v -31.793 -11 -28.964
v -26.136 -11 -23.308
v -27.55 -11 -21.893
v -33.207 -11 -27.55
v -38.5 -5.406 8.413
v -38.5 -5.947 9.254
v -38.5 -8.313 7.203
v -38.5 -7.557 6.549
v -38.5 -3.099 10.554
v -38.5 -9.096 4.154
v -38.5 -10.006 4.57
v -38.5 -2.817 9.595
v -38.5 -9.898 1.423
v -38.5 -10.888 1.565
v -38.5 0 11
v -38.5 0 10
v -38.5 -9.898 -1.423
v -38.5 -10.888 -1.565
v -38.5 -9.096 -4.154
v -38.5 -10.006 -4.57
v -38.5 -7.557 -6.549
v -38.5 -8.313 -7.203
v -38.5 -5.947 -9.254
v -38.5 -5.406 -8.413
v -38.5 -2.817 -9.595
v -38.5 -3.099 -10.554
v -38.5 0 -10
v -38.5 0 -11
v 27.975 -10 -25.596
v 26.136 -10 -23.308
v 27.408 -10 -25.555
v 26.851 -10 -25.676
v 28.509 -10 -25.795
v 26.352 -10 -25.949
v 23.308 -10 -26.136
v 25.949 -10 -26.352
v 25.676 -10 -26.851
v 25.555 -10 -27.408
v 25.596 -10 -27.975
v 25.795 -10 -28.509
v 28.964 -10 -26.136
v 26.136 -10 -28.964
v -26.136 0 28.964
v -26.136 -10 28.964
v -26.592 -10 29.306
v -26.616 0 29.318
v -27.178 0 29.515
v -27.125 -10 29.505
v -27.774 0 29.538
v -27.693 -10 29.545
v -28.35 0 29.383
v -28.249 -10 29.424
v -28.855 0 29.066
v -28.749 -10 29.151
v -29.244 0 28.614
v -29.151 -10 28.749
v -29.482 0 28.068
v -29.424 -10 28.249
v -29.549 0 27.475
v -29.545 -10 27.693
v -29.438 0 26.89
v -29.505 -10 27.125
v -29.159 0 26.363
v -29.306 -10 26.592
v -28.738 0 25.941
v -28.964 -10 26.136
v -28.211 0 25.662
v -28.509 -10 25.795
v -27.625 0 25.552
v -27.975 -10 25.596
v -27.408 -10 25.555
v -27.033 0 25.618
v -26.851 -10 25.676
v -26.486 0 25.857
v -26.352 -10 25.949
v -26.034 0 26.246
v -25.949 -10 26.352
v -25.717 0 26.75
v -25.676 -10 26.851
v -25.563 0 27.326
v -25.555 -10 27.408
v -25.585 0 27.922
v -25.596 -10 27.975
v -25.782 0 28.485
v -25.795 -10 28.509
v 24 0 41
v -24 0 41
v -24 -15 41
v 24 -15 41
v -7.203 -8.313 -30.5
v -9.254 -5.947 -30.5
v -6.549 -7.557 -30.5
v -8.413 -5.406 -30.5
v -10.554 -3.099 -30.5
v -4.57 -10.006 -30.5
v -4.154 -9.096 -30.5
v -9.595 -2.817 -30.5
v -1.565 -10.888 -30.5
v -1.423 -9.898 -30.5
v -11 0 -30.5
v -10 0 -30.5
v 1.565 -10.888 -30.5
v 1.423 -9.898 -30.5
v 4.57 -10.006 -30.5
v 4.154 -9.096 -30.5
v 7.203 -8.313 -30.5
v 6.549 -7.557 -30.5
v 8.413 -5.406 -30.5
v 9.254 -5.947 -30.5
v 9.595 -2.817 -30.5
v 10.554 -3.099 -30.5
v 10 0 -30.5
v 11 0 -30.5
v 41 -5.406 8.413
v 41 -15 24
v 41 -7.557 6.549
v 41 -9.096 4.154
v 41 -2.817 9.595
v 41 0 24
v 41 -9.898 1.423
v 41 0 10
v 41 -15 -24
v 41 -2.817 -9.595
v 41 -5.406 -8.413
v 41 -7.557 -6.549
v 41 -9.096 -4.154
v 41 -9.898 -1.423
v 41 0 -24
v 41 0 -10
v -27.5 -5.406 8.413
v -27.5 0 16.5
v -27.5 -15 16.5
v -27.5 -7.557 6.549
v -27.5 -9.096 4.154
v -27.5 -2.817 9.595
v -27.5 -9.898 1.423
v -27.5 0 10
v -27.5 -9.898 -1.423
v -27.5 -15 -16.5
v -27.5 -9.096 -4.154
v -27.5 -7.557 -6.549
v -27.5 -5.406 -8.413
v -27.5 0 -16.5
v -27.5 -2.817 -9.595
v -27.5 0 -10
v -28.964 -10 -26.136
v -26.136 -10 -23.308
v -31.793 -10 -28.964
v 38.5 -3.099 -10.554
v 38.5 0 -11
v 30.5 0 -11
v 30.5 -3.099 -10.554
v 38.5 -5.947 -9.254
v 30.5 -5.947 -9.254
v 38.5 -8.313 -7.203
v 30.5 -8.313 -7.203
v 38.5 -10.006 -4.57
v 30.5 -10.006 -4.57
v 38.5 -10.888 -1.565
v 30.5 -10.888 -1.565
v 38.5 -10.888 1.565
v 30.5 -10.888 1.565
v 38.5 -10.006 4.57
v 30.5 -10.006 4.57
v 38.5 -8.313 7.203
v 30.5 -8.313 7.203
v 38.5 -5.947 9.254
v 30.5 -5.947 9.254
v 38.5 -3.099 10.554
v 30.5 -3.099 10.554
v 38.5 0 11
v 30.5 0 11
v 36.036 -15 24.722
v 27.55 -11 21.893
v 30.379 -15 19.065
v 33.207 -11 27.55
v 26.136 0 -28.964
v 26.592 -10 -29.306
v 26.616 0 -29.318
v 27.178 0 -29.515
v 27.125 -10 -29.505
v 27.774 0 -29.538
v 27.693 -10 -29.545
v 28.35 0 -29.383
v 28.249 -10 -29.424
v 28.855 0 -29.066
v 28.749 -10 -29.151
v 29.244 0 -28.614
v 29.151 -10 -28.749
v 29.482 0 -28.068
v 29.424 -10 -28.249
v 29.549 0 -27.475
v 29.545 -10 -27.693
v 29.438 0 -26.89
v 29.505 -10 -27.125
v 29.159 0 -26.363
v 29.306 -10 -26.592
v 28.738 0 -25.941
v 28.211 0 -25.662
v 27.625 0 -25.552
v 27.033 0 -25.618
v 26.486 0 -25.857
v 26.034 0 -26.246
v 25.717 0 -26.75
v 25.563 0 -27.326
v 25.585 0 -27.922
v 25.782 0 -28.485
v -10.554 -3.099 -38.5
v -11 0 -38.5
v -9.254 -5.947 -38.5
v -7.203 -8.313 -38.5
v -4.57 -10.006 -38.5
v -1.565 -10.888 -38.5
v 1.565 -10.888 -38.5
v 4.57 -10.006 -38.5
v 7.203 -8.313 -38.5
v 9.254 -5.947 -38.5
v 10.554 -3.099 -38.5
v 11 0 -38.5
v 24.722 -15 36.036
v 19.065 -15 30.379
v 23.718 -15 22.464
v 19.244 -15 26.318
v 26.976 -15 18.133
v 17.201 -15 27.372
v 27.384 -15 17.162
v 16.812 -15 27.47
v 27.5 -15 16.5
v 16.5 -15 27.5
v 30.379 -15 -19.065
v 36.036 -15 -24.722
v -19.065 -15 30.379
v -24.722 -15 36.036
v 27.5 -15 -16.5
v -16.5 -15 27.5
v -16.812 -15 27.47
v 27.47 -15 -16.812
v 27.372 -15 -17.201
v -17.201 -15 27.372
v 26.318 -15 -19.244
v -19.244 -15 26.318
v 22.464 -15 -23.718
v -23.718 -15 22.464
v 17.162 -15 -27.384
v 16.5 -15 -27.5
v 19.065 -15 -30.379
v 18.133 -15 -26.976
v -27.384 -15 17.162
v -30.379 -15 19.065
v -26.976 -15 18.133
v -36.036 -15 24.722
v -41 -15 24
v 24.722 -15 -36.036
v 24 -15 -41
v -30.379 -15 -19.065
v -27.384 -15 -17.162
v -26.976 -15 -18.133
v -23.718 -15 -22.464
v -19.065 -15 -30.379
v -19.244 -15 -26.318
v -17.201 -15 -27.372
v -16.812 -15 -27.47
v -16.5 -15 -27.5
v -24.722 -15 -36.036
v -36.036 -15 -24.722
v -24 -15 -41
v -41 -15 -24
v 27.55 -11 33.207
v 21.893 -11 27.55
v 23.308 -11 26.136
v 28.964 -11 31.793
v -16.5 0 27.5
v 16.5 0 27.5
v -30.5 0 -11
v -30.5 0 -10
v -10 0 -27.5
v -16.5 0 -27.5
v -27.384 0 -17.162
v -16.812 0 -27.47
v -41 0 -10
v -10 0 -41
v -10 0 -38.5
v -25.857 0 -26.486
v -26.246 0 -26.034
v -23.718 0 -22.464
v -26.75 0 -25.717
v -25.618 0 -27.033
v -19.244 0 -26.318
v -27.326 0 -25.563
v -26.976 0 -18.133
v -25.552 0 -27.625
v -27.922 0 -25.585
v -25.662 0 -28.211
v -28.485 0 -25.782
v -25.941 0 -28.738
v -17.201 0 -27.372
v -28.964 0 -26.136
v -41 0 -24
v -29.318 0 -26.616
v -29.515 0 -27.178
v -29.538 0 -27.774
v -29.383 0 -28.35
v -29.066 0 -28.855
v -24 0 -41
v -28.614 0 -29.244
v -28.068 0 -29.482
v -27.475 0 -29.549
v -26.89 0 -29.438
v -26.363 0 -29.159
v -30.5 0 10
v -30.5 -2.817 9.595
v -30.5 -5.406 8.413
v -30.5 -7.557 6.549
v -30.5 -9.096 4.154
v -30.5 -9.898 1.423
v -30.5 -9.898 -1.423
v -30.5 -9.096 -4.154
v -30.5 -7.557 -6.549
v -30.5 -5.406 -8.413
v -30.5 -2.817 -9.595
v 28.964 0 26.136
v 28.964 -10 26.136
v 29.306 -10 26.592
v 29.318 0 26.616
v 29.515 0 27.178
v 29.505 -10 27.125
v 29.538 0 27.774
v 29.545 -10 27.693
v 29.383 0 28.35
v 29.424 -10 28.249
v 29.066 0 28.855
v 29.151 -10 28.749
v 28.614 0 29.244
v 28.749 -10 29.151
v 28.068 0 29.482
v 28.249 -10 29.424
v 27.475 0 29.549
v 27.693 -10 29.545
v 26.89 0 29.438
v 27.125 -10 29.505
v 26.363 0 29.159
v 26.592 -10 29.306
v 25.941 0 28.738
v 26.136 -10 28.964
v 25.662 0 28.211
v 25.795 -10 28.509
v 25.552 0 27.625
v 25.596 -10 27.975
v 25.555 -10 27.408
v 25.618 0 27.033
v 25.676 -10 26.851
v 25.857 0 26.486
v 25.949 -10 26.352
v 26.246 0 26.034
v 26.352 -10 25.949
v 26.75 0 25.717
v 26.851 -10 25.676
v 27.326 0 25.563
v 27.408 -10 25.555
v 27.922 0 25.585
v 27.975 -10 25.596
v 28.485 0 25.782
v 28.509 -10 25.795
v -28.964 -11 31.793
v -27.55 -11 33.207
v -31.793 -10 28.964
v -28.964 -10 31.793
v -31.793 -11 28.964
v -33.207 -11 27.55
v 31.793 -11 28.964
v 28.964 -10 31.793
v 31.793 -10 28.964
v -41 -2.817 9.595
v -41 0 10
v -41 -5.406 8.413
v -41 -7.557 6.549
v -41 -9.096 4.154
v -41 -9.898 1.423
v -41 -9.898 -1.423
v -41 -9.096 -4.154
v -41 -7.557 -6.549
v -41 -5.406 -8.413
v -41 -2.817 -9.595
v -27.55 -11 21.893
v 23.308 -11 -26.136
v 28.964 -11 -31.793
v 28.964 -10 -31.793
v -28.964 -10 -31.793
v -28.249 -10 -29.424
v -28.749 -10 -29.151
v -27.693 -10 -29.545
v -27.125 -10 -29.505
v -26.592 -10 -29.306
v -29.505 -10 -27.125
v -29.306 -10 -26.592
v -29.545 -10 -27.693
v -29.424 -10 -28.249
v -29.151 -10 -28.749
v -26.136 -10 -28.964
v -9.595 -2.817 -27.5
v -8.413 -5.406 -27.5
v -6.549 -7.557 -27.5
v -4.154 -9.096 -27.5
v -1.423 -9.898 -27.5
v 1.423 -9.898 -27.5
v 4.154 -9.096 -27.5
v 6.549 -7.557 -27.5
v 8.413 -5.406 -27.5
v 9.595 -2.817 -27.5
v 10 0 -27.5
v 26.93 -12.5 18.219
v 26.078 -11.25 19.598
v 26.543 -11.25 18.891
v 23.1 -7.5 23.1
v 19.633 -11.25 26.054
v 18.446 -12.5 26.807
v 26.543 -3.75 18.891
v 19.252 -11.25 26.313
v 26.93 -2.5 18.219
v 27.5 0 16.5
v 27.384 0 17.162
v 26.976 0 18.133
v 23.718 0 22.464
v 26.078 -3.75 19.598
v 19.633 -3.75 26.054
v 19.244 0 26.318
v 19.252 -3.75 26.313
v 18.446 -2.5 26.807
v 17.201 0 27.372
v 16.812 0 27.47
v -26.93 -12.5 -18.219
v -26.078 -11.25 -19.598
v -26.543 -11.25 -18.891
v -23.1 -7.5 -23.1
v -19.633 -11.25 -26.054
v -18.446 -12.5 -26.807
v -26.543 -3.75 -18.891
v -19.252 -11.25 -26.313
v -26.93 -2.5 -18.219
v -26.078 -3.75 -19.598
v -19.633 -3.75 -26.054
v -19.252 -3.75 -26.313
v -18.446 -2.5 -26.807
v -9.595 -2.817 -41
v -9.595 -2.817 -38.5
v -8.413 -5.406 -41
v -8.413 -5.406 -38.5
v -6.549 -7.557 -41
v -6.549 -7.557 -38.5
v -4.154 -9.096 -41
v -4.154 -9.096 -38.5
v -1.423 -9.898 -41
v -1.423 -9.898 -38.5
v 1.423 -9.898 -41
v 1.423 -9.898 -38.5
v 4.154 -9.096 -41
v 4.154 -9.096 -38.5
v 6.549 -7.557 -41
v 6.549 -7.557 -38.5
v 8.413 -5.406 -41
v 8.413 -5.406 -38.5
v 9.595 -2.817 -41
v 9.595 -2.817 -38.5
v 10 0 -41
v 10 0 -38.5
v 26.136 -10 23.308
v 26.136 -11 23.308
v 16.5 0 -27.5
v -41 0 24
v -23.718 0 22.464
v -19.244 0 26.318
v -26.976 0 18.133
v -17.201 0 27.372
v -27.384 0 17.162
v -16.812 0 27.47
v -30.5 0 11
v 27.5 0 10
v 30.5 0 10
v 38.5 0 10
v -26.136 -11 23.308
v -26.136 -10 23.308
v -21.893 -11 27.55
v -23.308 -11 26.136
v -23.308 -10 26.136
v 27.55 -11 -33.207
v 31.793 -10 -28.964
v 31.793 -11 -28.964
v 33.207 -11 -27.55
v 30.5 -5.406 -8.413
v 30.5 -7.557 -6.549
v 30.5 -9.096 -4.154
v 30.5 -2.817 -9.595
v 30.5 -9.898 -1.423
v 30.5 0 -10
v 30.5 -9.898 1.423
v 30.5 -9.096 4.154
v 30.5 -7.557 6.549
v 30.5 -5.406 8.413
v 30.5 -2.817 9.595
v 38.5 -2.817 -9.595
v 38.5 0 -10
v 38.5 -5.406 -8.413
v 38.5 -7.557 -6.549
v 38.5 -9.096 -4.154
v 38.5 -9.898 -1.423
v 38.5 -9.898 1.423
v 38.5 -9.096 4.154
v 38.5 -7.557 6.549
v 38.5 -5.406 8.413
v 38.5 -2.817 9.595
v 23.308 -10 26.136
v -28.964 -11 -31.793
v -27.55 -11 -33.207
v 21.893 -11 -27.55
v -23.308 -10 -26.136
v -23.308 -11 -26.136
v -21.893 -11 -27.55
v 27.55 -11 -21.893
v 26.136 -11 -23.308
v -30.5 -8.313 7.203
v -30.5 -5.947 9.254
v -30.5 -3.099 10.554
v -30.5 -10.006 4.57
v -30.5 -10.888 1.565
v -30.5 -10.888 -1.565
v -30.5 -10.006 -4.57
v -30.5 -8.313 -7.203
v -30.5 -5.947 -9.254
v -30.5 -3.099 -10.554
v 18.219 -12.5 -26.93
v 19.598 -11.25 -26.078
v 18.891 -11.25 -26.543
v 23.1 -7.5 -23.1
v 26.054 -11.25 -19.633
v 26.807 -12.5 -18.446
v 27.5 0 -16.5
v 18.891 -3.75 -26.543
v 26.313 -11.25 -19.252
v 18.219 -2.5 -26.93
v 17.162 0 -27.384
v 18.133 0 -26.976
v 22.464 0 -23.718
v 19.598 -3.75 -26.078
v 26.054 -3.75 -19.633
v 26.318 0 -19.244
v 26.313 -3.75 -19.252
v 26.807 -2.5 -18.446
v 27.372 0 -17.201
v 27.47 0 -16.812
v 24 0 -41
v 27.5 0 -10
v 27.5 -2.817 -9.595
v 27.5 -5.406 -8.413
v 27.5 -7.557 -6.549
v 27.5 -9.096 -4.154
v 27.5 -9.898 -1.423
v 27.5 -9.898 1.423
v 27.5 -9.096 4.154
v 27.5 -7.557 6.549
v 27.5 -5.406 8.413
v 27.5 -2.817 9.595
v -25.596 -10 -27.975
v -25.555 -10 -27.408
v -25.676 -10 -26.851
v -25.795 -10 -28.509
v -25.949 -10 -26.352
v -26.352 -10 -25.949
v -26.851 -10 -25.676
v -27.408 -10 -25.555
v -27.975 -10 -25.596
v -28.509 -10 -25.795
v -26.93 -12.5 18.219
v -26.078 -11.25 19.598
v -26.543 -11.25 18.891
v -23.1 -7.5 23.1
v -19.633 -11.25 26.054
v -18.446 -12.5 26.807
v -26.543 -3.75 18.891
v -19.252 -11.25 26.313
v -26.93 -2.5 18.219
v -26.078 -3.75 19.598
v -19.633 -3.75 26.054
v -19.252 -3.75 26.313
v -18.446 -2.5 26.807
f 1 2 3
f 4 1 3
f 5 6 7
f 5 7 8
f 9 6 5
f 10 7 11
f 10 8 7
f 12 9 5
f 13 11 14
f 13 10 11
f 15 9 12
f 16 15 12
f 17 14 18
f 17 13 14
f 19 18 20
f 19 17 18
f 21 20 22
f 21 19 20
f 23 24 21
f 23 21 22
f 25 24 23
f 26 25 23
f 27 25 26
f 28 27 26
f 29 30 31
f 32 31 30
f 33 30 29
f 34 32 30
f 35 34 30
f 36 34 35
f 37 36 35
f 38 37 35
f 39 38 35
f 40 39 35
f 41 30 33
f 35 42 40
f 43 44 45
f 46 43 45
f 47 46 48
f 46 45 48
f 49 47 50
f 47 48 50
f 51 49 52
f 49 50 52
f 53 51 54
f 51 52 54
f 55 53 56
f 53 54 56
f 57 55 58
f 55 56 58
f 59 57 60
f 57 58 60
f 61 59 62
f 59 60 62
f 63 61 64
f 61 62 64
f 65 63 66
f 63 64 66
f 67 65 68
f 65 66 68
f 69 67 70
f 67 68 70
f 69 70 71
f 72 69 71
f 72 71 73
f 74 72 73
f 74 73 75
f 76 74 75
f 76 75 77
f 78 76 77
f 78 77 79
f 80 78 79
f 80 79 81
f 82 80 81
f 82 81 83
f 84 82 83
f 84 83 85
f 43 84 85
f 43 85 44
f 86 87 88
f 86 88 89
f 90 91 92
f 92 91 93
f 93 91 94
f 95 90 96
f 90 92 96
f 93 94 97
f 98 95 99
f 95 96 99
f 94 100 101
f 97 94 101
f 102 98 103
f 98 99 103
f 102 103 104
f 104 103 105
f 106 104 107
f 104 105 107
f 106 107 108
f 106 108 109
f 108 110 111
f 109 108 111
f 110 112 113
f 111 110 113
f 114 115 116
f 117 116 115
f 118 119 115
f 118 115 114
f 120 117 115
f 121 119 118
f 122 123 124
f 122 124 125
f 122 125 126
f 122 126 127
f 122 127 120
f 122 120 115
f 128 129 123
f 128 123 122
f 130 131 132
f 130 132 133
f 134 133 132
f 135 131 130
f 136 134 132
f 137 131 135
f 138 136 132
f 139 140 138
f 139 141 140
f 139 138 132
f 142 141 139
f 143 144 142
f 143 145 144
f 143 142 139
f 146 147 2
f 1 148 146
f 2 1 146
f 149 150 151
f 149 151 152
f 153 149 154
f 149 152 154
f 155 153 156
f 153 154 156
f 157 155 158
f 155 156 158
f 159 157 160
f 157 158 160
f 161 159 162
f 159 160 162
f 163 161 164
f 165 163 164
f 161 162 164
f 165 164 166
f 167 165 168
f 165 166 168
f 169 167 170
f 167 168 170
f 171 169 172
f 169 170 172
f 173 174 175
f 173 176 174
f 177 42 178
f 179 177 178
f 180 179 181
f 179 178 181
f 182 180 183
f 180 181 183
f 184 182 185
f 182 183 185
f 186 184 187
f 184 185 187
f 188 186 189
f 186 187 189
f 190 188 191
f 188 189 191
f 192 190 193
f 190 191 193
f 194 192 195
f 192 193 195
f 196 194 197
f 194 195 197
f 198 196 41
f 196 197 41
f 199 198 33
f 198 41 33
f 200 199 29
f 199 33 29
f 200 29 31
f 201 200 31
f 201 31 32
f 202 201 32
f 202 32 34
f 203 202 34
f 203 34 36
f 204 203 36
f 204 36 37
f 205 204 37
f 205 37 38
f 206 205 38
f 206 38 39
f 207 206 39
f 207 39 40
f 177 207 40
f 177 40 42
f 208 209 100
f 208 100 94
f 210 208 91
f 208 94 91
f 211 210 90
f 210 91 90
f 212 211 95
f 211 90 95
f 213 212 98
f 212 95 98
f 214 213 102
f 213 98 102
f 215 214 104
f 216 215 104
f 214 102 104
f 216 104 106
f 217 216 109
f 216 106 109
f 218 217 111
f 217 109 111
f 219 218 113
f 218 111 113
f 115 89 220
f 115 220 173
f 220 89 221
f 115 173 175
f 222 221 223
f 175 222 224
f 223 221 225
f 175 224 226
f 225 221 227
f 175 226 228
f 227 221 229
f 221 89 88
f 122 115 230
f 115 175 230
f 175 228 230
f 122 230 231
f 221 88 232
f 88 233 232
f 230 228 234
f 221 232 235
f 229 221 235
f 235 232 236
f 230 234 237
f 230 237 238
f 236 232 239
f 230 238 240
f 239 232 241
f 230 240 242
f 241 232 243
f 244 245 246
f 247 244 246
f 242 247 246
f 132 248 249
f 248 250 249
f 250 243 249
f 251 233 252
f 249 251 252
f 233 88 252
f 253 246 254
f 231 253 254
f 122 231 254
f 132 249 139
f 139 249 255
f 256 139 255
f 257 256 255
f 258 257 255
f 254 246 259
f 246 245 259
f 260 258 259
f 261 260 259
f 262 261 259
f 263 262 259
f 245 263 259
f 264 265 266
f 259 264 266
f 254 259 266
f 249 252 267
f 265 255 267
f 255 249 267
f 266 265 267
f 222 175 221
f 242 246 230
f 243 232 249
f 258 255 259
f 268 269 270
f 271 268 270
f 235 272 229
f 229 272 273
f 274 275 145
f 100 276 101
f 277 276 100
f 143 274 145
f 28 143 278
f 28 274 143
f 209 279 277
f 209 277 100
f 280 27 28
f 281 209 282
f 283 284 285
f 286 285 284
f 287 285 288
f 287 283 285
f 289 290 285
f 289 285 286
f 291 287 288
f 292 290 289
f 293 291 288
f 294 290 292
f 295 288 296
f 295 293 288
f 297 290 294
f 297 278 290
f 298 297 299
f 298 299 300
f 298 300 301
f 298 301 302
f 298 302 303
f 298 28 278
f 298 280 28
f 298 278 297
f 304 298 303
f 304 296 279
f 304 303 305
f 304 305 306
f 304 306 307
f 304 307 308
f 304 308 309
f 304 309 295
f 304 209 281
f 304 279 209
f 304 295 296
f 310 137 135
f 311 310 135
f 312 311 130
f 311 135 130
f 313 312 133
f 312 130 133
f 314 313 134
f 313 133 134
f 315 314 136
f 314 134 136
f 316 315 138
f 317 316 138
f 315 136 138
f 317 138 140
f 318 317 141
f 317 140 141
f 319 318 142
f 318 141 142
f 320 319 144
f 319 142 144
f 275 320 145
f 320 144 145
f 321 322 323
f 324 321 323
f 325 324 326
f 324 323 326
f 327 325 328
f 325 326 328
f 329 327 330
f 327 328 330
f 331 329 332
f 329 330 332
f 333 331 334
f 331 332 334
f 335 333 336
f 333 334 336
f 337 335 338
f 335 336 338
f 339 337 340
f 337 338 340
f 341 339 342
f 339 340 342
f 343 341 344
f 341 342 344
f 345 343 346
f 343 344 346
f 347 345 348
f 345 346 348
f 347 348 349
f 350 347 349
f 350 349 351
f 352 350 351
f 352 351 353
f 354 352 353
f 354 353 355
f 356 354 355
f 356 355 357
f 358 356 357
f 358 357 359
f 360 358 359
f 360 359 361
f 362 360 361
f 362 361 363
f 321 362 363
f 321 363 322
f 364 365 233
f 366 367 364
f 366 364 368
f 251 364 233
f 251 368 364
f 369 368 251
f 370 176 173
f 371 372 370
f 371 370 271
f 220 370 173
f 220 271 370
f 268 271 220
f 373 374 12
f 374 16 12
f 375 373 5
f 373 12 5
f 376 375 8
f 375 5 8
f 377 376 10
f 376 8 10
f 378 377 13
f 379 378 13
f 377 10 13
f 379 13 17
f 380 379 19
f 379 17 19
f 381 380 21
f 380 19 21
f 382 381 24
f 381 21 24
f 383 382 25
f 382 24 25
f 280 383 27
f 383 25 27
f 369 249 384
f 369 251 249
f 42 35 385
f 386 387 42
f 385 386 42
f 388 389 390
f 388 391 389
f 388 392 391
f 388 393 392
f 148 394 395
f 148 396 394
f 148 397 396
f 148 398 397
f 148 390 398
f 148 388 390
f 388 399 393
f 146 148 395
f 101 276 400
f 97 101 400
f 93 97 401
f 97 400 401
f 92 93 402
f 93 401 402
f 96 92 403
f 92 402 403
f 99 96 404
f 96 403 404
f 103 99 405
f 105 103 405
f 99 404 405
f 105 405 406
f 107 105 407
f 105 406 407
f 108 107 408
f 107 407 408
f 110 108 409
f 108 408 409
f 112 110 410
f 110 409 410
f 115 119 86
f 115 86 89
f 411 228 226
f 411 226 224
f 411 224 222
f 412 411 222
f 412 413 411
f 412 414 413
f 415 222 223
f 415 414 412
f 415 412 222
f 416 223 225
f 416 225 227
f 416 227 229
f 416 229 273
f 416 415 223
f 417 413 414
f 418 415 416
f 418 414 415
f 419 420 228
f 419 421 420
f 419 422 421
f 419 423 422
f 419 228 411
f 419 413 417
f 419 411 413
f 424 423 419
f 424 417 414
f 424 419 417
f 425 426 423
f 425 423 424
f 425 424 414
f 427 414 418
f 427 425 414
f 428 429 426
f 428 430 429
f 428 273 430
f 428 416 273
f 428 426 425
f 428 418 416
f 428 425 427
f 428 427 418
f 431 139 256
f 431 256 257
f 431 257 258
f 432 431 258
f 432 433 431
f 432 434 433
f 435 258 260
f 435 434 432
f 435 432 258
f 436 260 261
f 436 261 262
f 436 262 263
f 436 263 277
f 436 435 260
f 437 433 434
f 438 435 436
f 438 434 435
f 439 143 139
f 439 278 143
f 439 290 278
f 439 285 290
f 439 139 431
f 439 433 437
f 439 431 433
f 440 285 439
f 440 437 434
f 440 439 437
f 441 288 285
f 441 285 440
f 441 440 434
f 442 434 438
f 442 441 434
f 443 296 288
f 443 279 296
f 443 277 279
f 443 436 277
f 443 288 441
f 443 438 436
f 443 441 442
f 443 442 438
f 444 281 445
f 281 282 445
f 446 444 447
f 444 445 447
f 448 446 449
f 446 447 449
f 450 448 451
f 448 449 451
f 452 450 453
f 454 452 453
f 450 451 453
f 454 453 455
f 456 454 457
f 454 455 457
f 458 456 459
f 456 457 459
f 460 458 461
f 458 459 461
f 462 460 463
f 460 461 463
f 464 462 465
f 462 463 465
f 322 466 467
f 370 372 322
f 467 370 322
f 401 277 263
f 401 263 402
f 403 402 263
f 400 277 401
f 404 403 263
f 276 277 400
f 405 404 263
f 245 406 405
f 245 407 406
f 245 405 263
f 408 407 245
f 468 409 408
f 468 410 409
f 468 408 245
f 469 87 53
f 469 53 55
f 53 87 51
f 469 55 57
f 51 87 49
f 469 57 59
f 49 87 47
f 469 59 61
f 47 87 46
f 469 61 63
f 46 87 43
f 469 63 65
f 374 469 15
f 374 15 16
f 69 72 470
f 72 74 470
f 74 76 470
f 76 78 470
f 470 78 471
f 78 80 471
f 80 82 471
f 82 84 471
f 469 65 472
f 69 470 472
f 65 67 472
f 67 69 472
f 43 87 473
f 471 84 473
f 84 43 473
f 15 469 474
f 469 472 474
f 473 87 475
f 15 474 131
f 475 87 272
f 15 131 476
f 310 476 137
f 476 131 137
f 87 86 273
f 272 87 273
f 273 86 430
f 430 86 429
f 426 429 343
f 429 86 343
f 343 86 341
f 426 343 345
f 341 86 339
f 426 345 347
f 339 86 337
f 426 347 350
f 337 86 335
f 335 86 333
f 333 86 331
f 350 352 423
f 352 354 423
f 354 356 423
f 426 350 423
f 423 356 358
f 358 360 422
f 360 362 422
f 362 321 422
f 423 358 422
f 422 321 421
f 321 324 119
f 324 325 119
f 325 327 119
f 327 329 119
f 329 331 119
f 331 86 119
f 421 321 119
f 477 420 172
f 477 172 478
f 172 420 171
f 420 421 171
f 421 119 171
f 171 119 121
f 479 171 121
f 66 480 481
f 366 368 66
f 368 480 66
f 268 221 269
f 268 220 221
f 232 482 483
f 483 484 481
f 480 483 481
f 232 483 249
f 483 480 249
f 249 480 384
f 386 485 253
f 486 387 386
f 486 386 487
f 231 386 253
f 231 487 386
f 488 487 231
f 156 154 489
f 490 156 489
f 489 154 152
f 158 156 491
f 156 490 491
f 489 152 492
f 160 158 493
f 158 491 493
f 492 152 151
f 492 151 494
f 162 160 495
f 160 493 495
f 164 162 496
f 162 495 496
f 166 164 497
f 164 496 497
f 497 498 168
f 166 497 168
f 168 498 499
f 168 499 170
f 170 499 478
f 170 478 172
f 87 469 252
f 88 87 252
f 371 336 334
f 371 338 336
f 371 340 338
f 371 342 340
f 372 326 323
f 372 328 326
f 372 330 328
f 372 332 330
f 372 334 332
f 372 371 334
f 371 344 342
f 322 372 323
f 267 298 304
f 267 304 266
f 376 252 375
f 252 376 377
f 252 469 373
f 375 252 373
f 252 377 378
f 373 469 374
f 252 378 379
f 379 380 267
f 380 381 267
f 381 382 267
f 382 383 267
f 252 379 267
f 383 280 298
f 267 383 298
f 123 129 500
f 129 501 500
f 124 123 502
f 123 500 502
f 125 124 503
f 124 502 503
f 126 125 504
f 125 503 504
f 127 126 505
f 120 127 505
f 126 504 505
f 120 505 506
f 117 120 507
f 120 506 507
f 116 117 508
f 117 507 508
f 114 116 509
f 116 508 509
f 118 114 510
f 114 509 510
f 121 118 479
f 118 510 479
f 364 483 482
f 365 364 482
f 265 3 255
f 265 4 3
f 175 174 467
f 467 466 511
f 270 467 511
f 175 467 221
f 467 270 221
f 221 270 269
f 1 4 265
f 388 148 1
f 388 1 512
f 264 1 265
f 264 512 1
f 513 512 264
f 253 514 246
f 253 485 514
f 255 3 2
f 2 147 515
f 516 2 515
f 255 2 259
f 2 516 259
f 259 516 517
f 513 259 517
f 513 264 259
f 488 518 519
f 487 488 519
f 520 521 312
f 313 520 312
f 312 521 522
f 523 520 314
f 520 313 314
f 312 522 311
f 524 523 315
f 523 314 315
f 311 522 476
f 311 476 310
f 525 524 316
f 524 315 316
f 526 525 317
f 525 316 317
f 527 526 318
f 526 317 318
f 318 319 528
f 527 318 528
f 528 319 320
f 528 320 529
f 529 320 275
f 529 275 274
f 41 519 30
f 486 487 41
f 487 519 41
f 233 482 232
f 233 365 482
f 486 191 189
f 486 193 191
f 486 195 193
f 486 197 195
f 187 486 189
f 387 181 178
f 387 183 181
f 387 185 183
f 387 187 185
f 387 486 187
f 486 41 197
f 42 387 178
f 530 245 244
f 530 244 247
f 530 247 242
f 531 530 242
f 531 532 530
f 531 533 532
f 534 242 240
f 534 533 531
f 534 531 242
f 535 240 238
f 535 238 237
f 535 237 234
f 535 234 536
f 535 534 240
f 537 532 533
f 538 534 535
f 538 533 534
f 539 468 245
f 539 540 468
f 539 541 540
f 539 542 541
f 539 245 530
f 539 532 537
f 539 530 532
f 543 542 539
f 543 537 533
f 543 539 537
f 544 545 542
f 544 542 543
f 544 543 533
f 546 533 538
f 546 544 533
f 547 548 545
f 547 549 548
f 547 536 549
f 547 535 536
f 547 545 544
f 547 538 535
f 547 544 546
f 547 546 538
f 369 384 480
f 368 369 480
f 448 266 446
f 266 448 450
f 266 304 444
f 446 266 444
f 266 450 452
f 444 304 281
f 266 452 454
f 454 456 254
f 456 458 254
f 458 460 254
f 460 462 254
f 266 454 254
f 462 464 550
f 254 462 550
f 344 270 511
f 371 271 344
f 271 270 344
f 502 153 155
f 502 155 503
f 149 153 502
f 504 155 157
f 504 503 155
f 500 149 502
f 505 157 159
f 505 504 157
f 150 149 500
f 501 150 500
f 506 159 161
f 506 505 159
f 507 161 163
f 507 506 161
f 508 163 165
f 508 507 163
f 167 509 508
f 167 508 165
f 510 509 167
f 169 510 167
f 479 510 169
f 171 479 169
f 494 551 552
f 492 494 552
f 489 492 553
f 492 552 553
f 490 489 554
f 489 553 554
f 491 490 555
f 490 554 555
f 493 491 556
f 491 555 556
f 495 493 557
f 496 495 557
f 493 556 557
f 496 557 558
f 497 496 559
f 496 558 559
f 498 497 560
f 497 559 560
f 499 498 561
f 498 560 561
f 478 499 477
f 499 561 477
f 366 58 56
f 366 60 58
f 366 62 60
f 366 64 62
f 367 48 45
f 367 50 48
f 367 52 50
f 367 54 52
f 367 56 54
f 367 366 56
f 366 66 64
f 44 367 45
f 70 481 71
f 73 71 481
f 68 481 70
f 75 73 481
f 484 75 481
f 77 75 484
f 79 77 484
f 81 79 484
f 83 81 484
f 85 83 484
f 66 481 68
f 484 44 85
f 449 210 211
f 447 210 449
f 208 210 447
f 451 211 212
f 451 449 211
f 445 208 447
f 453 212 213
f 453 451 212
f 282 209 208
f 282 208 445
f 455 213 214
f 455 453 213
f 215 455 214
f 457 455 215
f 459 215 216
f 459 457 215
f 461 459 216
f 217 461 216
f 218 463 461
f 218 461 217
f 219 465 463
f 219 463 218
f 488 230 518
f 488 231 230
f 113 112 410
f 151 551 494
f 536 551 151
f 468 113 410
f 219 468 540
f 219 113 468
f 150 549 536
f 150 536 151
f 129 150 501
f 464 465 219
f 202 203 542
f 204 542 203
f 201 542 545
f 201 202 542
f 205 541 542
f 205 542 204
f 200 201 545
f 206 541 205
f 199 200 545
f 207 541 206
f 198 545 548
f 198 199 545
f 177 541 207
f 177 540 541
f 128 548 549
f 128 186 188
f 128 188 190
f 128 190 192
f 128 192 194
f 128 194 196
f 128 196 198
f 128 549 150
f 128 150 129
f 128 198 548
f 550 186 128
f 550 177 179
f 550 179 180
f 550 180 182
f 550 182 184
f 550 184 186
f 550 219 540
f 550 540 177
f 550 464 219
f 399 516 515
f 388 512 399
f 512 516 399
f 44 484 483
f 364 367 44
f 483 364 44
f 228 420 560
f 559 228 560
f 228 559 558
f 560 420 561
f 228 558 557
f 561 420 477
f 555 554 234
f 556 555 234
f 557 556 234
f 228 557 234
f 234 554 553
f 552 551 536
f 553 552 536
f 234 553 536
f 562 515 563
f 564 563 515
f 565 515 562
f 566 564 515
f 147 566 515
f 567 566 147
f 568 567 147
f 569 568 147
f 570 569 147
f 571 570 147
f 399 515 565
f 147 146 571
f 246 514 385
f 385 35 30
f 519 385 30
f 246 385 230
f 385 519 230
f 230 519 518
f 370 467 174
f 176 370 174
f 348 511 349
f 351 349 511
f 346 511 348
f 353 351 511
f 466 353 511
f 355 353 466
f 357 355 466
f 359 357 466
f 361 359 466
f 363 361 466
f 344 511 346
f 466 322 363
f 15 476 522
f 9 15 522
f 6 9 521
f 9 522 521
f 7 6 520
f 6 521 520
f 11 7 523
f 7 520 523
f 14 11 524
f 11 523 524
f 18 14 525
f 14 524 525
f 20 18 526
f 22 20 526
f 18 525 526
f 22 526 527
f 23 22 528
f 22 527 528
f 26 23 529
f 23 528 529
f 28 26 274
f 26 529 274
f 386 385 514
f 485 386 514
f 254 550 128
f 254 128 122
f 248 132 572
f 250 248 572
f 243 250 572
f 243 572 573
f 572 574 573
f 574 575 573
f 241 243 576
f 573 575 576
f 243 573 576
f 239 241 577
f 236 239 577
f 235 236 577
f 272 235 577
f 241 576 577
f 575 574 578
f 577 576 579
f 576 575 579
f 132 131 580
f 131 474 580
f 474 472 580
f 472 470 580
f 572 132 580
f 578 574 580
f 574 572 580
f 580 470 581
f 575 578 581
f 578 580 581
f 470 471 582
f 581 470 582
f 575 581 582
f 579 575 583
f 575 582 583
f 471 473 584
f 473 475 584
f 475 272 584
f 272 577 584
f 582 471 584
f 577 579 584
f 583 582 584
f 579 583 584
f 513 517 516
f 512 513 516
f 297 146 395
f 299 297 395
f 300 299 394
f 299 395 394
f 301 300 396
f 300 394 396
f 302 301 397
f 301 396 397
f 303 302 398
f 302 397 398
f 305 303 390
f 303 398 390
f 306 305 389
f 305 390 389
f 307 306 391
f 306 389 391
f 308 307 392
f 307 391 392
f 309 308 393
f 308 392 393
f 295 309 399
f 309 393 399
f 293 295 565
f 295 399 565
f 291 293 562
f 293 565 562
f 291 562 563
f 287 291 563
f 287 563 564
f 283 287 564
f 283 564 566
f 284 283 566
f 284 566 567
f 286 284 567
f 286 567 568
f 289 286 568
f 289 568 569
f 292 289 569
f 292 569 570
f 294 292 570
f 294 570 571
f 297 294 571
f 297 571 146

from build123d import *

# Parameters (mm, degrees)
SKETCH1_W           = 82
SKETCH1_H           = 82
SKETCH1_W_2         = 55
SKETCH1_H_2         = 55
BOSS_EXTRUDE1_DEPTH = 15
SKETCH2_R           = 10
CUT_EXTRUDE1_DEPTH  = 60.891568689
CUT_EXTRUDE2_START  = -30.5
SKETCH3_R           = 11
CUT_EXTRUDE2_DEPTH  = 8
CIRPATTERN3_COUNT   = 3
CIRPATTERN3_ANGLE   = 180
FILLET1_SIZE        = 11
CHAMFER1_SIZE       = 17
CUT_EXTRUDE3_START  = -7
CUT_EXTRUDE3_DEPTH  = 4
SKETCH5_R           = 2
CUT_EXTRUDE4_DEPTH  = 59.83876289
CIRPATTERN4_COUNT   = 4


with BuildPart() as part:
    # Sketch1 → Boss-Extrude1 (new body)
    with BuildSketch(Plane(origin=(0, 0, 0), x_dir=(1, 0, 0), z_dir=(0, 1, 0))):
        Rectangle(SKETCH1_W, SKETCH1_H)
        Rectangle(SKETCH1_W_2, SKETCH1_H_2, mode=Mode.SUBTRACT)
    extrude(amount=-BOSS_EXTRUDE1_DEPTH)

    # Sketch2 → Cut-Extrude1 (cut, through all)
    with BuildSketch(Plane(origin=(0, 0, 0), x_dir=(0, 0, -1), z_dir=(1, 0, 0))):
        Circle(SKETCH2_R)
    cut_extrude1 = extrude(amount=-CUT_EXTRUDE1_DEPTH, mode=Mode.SUBTRACT)

    # Sketch3 → Cut-Extrude2 (cut)
    with BuildSketch(Plane(origin=(0, 0, 0), x_dir=(0, 0, -1), z_dir=(1, 0, 0)).offset(CUT_EXTRUDE2_START)):
        Circle(SKETCH3_R)
    cut_extrude2 = extrude(amount=-CUT_EXTRUDE2_DEPTH, mode=Mode.SUBTRACT)

    # CirPattern3: Cut-Extrude1, Cut-Extrude2 ×3 about axis
    cirpattern3_axis = Axis((0, 0, 0), (0, -1, 0))
    add([cut_extrude1.rotate(cirpattern3_axis, i * CIRPATTERN3_ANGLE / (CIRPATTERN3_COUNT - 1)) for i in range(1, CIRPATTERN3_COUNT)], mode=Mode.SUBTRACT)
    add([cut_extrude2.rotate(cirpattern3_axis, i * CIRPATTERN3_ANGLE / (CIRPATTERN3_COUNT - 1)) for i in range(1, CIRPATTERN3_COUNT)], mode=Mode.SUBTRACT)

    # Fillet1
    # a fillet whose section is not a circle: 11 mm, written as the material it adds along each edge
    with BuildSketch(Plane(origin=(-27.5, 0, 27.5), x_dir=(0, 0, -1), z_dir=(0, -1, 0))) as fillet1_piece_1:
        with BuildLine():
            Bezier((FILLET1_SIZE, 0), (0, 0), (0, FILLET1_SIZE), weights=[1, 0.25, 1])
            Line((0, FILLET1_SIZE), (0, 0))
            Line((0, 0), (FILLET1_SIZE, 0))
        make_face()
    extrude(amount=15)
    with BuildSketch(Plane(origin=(-27.5, 0, -27.5), x_dir=(0, 0, 1), z_dir=(0, -1, 0)), Plane(origin=(27.5, 0, 27.5), x_dir=(0, 0, -1), z_dir=(0, -1, 0)), Plane(origin=(27.5, 0, -27.5), x_dir=(-1, 0, 0), z_dir=(0, -1, 0))) as fillet1_piece_2:
        with BuildLine():
            Bezier((FILLET1_SIZE, 0), (0, 0), (0, -FILLET1_SIZE), weights=[1, 0.25, 1])
            Line((0, -FILLET1_SIZE), (0, 0))
            Line((0, 0), (FILLET1_SIZE, 0))
        make_face()
    extrude(amount=15)

    # Chamfer1
    chamfer1_edges = [part.edges().sort_by_distance(p)[0] for p in [
        (41, -7.5, 41),
        (-41, -7.5, 41),
        (-41, -7.5, -41),
        (41, -7.5, -41),
    ]]
    chamfer(chamfer1_edges, length=CHAMFER1_SIZE)

    # Sketch4 → Cut-Extrude3 (cut, symmetric)
    with BuildSketch(Plane(origin=(32.5, 0, -32.5), x_dir=(-0.7071067811865488, 0, -0.7071067811865464), z_dir=(0.7071067811865464, 0, -0.7071067811865488)).offset(CUT_EXTRUDE3_START)):
        Polygon((-2, -10), (2, -10), (2, -11), (4, -11), (8, -15), (-8, -15), (-4, -11), (-2, -11), align=None)
    cut_extrude3 = extrude(amount=CUT_EXTRUDE3_DEPTH, both=True, mode=Mode.SUBTRACT)

    # Sketch5 → Cut-Extrude4 (cut, through all)
    with BuildSketch(Plane.XZ.offset(10)):
        with Locations(Location((27.550252532, -27.550252532, 0), (0, 0, 225))):
            Circle(SKETCH5_R)
    cut_extrude4 = extrude(amount=-CUT_EXTRUDE4_DEPTH, mode=Mode.SUBTRACT)

    # CirPattern4: Cut-Extrude3, Cut-Extrude4 ×4 about axis
    cirpattern4_axis = Axis((0, 0, 0), (0, 1, 0))
    add([cut_extrude3.rotate(cirpattern4_axis, i * 360 / CIRPATTERN4_COUNT) for i in range(1, CIRPATTERN4_COUNT)], mode=Mode.SUBTRACT)
    add([cut_extrude4.rotate(cirpattern4_axis, i * 360 / CIRPATTERN4_COUNT) for i in range(1, CIRPATTERN4_COUNT)], mode=Mode.SUBTRACT)


solid = part.part
